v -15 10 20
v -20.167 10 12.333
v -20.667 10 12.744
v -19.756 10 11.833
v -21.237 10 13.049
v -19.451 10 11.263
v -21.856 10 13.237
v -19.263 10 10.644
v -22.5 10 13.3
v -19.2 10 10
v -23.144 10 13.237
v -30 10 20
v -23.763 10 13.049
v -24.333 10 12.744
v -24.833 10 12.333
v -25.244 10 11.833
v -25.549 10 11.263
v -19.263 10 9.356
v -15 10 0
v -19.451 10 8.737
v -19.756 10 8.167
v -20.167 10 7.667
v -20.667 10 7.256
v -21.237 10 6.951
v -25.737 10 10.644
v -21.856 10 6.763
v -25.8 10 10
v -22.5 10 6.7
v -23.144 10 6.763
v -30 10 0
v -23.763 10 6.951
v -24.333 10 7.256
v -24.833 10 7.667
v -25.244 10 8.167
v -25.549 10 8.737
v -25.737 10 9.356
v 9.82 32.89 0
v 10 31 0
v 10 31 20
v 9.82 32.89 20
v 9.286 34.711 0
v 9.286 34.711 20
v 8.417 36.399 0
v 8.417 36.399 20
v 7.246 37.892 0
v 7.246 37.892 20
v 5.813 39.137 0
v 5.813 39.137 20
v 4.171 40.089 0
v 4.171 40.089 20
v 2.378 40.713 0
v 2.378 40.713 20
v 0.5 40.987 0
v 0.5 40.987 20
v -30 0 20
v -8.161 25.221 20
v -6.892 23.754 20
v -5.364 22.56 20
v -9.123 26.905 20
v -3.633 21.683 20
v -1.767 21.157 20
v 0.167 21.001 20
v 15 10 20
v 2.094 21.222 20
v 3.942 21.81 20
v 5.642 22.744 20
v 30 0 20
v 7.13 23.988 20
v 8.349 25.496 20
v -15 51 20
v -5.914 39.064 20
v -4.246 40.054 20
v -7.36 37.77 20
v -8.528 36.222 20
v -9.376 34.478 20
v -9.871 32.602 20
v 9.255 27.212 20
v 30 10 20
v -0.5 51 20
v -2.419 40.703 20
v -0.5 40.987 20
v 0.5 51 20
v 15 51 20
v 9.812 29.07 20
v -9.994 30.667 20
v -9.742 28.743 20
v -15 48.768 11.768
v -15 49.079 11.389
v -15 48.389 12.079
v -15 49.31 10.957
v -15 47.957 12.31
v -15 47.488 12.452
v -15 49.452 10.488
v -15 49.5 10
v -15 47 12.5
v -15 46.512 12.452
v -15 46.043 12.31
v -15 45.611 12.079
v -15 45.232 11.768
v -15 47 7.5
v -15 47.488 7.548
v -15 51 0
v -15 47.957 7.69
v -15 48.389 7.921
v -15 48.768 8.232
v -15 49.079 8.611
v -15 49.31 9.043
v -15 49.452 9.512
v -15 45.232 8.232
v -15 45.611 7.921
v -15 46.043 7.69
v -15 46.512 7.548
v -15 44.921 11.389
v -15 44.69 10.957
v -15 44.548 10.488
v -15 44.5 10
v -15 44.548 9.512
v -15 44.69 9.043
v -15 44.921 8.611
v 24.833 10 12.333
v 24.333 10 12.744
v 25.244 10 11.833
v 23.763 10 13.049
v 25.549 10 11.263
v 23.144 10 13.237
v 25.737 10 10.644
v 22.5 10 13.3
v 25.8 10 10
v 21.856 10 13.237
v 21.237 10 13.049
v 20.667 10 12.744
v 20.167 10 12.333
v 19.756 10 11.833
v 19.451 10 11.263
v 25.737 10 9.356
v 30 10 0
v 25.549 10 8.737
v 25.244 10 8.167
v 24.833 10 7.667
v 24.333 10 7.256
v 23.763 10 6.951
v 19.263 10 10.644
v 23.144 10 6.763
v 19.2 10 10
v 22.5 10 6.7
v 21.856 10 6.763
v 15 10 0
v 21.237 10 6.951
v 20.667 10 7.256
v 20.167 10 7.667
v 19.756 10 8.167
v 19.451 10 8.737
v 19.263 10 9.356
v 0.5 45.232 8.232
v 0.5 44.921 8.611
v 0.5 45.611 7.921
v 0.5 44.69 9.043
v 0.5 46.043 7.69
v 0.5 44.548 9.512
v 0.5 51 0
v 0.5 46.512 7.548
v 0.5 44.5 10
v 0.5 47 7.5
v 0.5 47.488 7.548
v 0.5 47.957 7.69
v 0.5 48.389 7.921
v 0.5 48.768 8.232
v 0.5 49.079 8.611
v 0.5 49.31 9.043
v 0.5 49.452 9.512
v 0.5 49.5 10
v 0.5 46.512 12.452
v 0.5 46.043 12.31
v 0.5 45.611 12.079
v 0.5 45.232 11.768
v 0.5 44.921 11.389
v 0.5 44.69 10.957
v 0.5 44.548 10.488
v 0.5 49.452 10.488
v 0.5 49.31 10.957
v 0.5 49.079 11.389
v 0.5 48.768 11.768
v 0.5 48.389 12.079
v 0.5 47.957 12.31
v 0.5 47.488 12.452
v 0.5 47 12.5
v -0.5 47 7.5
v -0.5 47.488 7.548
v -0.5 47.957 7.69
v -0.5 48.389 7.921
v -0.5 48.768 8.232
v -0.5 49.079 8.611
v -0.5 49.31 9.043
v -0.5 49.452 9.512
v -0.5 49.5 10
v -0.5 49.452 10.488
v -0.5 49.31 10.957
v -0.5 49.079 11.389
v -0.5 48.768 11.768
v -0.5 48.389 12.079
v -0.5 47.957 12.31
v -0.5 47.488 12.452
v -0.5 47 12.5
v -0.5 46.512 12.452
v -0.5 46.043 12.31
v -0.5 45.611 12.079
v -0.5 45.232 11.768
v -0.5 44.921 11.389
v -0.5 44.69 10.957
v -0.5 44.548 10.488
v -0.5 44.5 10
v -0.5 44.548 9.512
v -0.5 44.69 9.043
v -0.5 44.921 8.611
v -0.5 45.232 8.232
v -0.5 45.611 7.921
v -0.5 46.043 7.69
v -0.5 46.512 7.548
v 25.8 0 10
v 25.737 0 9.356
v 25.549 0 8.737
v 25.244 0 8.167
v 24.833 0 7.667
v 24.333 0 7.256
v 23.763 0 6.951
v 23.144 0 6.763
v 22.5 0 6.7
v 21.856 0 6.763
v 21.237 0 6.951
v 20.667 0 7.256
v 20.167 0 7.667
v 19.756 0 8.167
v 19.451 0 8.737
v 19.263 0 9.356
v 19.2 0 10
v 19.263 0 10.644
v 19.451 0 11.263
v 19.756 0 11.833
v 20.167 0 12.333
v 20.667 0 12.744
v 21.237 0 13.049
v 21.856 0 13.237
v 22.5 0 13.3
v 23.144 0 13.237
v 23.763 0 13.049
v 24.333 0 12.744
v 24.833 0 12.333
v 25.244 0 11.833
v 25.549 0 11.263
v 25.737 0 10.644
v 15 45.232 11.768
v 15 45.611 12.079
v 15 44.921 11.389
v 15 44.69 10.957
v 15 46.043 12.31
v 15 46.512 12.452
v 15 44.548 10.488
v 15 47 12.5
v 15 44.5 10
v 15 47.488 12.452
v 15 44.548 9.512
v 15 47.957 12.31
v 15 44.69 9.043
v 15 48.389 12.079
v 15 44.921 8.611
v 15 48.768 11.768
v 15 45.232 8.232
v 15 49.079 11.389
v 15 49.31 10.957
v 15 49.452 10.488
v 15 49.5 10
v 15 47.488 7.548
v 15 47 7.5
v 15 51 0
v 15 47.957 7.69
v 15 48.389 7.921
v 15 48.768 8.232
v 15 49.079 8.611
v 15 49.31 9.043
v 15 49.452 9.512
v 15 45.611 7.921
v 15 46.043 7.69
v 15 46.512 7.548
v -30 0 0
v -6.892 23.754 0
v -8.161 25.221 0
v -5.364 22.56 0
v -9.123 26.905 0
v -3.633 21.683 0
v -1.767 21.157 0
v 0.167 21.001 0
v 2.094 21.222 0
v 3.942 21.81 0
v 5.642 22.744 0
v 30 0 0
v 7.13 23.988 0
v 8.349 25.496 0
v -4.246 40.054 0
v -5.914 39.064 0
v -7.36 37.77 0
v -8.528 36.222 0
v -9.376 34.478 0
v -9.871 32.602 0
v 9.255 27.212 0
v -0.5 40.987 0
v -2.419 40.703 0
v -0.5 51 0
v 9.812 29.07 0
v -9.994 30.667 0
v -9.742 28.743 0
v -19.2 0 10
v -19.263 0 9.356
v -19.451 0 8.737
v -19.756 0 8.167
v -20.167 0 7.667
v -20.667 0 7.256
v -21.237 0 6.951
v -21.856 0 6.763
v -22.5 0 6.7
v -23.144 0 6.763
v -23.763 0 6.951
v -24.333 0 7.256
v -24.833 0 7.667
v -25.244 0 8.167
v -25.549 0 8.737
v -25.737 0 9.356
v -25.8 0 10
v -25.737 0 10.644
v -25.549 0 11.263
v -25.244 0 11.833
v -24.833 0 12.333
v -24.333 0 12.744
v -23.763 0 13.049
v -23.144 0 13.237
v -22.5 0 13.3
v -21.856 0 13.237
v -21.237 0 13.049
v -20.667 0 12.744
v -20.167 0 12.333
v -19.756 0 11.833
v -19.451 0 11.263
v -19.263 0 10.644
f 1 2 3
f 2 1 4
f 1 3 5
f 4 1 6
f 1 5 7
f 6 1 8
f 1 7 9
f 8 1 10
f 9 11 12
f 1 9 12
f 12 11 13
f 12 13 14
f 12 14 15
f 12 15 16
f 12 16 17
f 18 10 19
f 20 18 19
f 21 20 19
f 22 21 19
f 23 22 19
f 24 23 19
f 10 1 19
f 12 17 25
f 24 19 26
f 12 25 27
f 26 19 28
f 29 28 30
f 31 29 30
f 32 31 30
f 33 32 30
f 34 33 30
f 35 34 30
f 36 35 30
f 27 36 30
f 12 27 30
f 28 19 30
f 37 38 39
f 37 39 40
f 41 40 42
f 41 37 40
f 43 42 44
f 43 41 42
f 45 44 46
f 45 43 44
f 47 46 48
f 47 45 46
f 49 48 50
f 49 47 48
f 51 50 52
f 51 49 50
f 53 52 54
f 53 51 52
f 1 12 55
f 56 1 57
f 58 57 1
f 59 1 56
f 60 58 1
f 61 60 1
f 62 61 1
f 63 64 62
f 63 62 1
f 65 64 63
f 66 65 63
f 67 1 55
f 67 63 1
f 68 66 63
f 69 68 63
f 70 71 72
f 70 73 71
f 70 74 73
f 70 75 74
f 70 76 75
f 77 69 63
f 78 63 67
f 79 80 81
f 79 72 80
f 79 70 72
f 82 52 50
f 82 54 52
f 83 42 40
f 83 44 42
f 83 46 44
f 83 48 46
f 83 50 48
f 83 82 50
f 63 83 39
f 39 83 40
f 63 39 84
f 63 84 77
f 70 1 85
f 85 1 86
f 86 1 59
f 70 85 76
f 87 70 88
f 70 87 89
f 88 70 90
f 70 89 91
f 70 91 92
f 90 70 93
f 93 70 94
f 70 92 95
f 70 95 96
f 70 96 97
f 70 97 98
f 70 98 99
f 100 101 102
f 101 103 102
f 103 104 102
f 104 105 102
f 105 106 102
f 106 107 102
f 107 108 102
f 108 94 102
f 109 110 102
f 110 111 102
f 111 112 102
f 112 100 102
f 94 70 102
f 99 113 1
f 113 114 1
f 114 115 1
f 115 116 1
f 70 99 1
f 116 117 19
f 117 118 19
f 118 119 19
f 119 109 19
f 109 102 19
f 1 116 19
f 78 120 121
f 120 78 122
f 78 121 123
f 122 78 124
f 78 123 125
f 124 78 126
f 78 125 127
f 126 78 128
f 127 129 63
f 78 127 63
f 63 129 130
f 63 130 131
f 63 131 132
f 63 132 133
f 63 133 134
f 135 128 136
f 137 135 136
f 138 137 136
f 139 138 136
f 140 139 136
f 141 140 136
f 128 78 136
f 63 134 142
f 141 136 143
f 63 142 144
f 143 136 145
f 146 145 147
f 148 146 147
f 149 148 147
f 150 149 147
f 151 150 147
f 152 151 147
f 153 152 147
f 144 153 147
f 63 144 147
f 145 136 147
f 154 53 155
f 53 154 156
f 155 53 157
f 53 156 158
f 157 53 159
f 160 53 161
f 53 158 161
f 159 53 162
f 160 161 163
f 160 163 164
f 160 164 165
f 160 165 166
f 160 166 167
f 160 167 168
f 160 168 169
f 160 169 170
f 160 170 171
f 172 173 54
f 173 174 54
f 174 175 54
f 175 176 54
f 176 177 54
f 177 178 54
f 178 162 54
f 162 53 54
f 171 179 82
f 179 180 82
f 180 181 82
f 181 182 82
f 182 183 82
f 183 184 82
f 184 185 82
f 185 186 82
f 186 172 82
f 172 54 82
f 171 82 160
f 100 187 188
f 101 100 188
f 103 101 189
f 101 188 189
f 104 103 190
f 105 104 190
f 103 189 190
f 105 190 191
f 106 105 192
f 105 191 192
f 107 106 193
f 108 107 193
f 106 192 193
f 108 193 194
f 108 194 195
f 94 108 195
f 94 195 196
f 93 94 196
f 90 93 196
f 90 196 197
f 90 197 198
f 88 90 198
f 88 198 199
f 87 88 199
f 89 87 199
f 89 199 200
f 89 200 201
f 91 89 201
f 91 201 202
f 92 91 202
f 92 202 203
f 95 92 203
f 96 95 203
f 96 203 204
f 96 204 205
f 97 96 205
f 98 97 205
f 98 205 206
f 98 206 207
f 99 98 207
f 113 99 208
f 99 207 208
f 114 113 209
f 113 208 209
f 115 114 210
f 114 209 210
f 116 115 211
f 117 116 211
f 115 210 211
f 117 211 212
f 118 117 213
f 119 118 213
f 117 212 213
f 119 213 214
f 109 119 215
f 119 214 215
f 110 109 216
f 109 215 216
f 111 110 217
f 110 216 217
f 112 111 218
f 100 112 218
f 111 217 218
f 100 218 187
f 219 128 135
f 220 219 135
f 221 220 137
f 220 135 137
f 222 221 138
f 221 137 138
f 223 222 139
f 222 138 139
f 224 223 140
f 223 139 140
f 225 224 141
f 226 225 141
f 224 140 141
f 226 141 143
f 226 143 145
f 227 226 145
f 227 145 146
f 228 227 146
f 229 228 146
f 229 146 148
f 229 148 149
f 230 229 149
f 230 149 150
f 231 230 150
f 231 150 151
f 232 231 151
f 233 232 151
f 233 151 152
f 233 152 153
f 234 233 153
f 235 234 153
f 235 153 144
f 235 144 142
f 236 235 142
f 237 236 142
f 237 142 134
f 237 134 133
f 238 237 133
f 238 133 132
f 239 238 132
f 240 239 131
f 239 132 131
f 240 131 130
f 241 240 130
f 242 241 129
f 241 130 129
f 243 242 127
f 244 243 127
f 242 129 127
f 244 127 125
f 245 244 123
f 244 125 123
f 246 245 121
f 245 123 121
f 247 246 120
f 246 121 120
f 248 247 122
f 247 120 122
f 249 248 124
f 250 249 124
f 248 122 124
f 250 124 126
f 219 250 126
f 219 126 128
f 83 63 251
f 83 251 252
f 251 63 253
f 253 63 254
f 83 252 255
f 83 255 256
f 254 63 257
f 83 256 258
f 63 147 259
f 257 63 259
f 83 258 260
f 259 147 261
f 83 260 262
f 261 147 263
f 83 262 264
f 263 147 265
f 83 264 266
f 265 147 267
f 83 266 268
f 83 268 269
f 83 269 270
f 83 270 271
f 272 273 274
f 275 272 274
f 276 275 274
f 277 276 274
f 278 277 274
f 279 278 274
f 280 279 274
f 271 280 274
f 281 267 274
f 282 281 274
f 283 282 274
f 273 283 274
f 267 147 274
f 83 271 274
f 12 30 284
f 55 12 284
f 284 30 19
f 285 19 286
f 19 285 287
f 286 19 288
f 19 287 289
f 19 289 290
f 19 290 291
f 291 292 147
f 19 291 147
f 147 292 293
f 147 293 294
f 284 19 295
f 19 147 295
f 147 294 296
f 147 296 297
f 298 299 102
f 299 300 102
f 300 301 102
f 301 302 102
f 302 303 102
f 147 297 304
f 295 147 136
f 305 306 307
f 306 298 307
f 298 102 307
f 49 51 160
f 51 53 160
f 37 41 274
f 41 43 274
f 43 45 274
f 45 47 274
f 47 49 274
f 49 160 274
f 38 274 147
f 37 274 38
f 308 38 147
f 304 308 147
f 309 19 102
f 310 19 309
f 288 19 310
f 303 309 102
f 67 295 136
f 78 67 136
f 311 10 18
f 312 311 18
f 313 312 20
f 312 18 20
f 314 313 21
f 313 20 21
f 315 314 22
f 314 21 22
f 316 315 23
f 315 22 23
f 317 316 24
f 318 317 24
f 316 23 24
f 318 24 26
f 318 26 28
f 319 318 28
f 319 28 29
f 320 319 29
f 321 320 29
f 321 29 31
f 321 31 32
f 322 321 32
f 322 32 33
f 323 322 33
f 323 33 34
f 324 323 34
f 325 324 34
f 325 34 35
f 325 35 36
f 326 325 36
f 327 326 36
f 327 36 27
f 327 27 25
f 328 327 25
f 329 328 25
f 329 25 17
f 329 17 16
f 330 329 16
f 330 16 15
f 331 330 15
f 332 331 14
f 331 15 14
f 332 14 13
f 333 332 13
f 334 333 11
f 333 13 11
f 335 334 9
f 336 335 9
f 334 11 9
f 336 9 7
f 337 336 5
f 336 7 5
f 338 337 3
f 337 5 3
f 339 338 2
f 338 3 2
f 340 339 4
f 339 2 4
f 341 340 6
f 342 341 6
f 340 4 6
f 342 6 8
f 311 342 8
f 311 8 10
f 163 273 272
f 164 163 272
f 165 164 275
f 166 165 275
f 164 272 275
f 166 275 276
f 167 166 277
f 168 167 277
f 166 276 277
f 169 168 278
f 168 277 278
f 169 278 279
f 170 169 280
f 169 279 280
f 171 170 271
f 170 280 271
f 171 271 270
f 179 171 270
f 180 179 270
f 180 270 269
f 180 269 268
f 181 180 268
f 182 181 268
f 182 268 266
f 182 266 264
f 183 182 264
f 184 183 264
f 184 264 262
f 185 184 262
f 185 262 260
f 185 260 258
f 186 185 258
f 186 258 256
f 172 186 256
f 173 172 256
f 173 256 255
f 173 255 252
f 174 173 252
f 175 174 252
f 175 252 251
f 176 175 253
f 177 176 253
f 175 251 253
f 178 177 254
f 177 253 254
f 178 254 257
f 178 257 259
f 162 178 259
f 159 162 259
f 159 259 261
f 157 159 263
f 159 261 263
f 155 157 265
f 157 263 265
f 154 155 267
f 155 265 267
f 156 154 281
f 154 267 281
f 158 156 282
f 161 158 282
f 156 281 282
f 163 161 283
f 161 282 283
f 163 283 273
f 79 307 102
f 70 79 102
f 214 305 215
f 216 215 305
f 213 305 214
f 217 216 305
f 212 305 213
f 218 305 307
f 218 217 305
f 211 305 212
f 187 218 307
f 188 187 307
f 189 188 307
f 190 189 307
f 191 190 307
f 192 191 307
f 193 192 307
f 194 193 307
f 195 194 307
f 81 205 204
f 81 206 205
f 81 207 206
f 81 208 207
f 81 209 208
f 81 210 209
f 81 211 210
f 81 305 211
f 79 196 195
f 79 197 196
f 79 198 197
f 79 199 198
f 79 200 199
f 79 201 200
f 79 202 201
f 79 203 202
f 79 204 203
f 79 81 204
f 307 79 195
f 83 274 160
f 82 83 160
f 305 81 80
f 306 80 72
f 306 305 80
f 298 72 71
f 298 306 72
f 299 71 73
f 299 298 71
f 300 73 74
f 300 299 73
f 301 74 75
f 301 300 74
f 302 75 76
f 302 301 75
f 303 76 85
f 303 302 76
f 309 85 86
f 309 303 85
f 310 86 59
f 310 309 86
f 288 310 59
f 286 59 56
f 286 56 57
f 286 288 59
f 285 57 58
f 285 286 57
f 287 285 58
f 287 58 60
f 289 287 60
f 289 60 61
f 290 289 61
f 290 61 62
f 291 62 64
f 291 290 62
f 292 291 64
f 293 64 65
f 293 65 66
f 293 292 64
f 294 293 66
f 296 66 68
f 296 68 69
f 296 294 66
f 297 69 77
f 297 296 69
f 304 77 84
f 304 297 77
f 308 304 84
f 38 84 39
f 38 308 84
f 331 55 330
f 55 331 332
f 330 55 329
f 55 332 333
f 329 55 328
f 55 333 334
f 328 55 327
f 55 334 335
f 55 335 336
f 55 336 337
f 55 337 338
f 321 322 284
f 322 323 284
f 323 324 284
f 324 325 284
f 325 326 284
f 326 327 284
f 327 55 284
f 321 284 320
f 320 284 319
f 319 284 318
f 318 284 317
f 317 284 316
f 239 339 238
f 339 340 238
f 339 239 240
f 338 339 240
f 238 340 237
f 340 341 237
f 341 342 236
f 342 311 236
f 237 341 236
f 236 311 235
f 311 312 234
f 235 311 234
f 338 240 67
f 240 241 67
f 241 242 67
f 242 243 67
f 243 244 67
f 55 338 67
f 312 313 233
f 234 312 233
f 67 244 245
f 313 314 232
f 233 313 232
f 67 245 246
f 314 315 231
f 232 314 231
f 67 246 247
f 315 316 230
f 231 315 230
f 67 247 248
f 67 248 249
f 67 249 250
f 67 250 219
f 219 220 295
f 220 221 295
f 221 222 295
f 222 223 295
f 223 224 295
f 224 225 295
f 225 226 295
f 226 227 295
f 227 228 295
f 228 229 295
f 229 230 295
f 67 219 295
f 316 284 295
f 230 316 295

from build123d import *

# Parameters (mm, degrees)
SKETCH1_R           = 10
BOSS_EXTRUDE1_DEPTH = 20
SKETCH3_W           = 1
SKETCH3_H           = 10.850896804
CUT_EXTRUDE1_DEPTH  = 59
SKETCH2_R           = 2.5
CUT_EXTRUDE3_DEPTH  = 31
SKETCH5_R           = 3.3
CUT_EXTRUDE5_DEPTH  = 22


with BuildPart() as part:
    # Sketch1 → Boss-Extrude1 (new body)
    with BuildSketch(Plane.XY):
        Polygon((-30, 0), (30, 0), (30, 10), (15, 10), (15, 51), (-15, 51), (-15, 10), (-30, 10), align=None)
        with Locations((0, 31)):
            Circle(SKETCH1_R, mode=Mode.SUBTRACT)
    extrude(amount=BOSS_EXTRUDE1_DEPTH)

    # Sketch3 → Cut-Extrude1 (cut)
    with BuildSketch(Plane.XY.offset(20)):
        with Locations((0, 45.574551598)):
            Rectangle(SKETCH3_W, SKETCH3_H)
    extrude(amount=-CUT_EXTRUDE1_DEPTH, mode=Mode.SUBTRACT)

    # Sketch2 → Cut-Extrude3 (cut)
    with BuildSketch(Plane(origin=(15, 0, 0), x_dir=(0, 0, -1), z_dir=(1, 0, 0))):
        with Locations((-10, 47)):
            Circle(SKETCH2_R)
    extrude(amount=-CUT_EXTRUDE3_DEPTH, mode=Mode.SUBTRACT)

    # Sketch5 → Cut-Extrude5 (cut)
    with BuildSketch(Plane(origin=(0, 10, 0), x_dir=(1, 0, 0), z_dir=(0, 1, 0))):
        with Locations((22.5, -10)):
            Circle(SKETCH5_R)
        with Locations((-22.5, -10)):
            Circle(SKETCH5_R)
    extrude(amount=-CUT_EXTRUDE5_DEPTH, mode=Mode.SUBTRACT)


solid = part.part
